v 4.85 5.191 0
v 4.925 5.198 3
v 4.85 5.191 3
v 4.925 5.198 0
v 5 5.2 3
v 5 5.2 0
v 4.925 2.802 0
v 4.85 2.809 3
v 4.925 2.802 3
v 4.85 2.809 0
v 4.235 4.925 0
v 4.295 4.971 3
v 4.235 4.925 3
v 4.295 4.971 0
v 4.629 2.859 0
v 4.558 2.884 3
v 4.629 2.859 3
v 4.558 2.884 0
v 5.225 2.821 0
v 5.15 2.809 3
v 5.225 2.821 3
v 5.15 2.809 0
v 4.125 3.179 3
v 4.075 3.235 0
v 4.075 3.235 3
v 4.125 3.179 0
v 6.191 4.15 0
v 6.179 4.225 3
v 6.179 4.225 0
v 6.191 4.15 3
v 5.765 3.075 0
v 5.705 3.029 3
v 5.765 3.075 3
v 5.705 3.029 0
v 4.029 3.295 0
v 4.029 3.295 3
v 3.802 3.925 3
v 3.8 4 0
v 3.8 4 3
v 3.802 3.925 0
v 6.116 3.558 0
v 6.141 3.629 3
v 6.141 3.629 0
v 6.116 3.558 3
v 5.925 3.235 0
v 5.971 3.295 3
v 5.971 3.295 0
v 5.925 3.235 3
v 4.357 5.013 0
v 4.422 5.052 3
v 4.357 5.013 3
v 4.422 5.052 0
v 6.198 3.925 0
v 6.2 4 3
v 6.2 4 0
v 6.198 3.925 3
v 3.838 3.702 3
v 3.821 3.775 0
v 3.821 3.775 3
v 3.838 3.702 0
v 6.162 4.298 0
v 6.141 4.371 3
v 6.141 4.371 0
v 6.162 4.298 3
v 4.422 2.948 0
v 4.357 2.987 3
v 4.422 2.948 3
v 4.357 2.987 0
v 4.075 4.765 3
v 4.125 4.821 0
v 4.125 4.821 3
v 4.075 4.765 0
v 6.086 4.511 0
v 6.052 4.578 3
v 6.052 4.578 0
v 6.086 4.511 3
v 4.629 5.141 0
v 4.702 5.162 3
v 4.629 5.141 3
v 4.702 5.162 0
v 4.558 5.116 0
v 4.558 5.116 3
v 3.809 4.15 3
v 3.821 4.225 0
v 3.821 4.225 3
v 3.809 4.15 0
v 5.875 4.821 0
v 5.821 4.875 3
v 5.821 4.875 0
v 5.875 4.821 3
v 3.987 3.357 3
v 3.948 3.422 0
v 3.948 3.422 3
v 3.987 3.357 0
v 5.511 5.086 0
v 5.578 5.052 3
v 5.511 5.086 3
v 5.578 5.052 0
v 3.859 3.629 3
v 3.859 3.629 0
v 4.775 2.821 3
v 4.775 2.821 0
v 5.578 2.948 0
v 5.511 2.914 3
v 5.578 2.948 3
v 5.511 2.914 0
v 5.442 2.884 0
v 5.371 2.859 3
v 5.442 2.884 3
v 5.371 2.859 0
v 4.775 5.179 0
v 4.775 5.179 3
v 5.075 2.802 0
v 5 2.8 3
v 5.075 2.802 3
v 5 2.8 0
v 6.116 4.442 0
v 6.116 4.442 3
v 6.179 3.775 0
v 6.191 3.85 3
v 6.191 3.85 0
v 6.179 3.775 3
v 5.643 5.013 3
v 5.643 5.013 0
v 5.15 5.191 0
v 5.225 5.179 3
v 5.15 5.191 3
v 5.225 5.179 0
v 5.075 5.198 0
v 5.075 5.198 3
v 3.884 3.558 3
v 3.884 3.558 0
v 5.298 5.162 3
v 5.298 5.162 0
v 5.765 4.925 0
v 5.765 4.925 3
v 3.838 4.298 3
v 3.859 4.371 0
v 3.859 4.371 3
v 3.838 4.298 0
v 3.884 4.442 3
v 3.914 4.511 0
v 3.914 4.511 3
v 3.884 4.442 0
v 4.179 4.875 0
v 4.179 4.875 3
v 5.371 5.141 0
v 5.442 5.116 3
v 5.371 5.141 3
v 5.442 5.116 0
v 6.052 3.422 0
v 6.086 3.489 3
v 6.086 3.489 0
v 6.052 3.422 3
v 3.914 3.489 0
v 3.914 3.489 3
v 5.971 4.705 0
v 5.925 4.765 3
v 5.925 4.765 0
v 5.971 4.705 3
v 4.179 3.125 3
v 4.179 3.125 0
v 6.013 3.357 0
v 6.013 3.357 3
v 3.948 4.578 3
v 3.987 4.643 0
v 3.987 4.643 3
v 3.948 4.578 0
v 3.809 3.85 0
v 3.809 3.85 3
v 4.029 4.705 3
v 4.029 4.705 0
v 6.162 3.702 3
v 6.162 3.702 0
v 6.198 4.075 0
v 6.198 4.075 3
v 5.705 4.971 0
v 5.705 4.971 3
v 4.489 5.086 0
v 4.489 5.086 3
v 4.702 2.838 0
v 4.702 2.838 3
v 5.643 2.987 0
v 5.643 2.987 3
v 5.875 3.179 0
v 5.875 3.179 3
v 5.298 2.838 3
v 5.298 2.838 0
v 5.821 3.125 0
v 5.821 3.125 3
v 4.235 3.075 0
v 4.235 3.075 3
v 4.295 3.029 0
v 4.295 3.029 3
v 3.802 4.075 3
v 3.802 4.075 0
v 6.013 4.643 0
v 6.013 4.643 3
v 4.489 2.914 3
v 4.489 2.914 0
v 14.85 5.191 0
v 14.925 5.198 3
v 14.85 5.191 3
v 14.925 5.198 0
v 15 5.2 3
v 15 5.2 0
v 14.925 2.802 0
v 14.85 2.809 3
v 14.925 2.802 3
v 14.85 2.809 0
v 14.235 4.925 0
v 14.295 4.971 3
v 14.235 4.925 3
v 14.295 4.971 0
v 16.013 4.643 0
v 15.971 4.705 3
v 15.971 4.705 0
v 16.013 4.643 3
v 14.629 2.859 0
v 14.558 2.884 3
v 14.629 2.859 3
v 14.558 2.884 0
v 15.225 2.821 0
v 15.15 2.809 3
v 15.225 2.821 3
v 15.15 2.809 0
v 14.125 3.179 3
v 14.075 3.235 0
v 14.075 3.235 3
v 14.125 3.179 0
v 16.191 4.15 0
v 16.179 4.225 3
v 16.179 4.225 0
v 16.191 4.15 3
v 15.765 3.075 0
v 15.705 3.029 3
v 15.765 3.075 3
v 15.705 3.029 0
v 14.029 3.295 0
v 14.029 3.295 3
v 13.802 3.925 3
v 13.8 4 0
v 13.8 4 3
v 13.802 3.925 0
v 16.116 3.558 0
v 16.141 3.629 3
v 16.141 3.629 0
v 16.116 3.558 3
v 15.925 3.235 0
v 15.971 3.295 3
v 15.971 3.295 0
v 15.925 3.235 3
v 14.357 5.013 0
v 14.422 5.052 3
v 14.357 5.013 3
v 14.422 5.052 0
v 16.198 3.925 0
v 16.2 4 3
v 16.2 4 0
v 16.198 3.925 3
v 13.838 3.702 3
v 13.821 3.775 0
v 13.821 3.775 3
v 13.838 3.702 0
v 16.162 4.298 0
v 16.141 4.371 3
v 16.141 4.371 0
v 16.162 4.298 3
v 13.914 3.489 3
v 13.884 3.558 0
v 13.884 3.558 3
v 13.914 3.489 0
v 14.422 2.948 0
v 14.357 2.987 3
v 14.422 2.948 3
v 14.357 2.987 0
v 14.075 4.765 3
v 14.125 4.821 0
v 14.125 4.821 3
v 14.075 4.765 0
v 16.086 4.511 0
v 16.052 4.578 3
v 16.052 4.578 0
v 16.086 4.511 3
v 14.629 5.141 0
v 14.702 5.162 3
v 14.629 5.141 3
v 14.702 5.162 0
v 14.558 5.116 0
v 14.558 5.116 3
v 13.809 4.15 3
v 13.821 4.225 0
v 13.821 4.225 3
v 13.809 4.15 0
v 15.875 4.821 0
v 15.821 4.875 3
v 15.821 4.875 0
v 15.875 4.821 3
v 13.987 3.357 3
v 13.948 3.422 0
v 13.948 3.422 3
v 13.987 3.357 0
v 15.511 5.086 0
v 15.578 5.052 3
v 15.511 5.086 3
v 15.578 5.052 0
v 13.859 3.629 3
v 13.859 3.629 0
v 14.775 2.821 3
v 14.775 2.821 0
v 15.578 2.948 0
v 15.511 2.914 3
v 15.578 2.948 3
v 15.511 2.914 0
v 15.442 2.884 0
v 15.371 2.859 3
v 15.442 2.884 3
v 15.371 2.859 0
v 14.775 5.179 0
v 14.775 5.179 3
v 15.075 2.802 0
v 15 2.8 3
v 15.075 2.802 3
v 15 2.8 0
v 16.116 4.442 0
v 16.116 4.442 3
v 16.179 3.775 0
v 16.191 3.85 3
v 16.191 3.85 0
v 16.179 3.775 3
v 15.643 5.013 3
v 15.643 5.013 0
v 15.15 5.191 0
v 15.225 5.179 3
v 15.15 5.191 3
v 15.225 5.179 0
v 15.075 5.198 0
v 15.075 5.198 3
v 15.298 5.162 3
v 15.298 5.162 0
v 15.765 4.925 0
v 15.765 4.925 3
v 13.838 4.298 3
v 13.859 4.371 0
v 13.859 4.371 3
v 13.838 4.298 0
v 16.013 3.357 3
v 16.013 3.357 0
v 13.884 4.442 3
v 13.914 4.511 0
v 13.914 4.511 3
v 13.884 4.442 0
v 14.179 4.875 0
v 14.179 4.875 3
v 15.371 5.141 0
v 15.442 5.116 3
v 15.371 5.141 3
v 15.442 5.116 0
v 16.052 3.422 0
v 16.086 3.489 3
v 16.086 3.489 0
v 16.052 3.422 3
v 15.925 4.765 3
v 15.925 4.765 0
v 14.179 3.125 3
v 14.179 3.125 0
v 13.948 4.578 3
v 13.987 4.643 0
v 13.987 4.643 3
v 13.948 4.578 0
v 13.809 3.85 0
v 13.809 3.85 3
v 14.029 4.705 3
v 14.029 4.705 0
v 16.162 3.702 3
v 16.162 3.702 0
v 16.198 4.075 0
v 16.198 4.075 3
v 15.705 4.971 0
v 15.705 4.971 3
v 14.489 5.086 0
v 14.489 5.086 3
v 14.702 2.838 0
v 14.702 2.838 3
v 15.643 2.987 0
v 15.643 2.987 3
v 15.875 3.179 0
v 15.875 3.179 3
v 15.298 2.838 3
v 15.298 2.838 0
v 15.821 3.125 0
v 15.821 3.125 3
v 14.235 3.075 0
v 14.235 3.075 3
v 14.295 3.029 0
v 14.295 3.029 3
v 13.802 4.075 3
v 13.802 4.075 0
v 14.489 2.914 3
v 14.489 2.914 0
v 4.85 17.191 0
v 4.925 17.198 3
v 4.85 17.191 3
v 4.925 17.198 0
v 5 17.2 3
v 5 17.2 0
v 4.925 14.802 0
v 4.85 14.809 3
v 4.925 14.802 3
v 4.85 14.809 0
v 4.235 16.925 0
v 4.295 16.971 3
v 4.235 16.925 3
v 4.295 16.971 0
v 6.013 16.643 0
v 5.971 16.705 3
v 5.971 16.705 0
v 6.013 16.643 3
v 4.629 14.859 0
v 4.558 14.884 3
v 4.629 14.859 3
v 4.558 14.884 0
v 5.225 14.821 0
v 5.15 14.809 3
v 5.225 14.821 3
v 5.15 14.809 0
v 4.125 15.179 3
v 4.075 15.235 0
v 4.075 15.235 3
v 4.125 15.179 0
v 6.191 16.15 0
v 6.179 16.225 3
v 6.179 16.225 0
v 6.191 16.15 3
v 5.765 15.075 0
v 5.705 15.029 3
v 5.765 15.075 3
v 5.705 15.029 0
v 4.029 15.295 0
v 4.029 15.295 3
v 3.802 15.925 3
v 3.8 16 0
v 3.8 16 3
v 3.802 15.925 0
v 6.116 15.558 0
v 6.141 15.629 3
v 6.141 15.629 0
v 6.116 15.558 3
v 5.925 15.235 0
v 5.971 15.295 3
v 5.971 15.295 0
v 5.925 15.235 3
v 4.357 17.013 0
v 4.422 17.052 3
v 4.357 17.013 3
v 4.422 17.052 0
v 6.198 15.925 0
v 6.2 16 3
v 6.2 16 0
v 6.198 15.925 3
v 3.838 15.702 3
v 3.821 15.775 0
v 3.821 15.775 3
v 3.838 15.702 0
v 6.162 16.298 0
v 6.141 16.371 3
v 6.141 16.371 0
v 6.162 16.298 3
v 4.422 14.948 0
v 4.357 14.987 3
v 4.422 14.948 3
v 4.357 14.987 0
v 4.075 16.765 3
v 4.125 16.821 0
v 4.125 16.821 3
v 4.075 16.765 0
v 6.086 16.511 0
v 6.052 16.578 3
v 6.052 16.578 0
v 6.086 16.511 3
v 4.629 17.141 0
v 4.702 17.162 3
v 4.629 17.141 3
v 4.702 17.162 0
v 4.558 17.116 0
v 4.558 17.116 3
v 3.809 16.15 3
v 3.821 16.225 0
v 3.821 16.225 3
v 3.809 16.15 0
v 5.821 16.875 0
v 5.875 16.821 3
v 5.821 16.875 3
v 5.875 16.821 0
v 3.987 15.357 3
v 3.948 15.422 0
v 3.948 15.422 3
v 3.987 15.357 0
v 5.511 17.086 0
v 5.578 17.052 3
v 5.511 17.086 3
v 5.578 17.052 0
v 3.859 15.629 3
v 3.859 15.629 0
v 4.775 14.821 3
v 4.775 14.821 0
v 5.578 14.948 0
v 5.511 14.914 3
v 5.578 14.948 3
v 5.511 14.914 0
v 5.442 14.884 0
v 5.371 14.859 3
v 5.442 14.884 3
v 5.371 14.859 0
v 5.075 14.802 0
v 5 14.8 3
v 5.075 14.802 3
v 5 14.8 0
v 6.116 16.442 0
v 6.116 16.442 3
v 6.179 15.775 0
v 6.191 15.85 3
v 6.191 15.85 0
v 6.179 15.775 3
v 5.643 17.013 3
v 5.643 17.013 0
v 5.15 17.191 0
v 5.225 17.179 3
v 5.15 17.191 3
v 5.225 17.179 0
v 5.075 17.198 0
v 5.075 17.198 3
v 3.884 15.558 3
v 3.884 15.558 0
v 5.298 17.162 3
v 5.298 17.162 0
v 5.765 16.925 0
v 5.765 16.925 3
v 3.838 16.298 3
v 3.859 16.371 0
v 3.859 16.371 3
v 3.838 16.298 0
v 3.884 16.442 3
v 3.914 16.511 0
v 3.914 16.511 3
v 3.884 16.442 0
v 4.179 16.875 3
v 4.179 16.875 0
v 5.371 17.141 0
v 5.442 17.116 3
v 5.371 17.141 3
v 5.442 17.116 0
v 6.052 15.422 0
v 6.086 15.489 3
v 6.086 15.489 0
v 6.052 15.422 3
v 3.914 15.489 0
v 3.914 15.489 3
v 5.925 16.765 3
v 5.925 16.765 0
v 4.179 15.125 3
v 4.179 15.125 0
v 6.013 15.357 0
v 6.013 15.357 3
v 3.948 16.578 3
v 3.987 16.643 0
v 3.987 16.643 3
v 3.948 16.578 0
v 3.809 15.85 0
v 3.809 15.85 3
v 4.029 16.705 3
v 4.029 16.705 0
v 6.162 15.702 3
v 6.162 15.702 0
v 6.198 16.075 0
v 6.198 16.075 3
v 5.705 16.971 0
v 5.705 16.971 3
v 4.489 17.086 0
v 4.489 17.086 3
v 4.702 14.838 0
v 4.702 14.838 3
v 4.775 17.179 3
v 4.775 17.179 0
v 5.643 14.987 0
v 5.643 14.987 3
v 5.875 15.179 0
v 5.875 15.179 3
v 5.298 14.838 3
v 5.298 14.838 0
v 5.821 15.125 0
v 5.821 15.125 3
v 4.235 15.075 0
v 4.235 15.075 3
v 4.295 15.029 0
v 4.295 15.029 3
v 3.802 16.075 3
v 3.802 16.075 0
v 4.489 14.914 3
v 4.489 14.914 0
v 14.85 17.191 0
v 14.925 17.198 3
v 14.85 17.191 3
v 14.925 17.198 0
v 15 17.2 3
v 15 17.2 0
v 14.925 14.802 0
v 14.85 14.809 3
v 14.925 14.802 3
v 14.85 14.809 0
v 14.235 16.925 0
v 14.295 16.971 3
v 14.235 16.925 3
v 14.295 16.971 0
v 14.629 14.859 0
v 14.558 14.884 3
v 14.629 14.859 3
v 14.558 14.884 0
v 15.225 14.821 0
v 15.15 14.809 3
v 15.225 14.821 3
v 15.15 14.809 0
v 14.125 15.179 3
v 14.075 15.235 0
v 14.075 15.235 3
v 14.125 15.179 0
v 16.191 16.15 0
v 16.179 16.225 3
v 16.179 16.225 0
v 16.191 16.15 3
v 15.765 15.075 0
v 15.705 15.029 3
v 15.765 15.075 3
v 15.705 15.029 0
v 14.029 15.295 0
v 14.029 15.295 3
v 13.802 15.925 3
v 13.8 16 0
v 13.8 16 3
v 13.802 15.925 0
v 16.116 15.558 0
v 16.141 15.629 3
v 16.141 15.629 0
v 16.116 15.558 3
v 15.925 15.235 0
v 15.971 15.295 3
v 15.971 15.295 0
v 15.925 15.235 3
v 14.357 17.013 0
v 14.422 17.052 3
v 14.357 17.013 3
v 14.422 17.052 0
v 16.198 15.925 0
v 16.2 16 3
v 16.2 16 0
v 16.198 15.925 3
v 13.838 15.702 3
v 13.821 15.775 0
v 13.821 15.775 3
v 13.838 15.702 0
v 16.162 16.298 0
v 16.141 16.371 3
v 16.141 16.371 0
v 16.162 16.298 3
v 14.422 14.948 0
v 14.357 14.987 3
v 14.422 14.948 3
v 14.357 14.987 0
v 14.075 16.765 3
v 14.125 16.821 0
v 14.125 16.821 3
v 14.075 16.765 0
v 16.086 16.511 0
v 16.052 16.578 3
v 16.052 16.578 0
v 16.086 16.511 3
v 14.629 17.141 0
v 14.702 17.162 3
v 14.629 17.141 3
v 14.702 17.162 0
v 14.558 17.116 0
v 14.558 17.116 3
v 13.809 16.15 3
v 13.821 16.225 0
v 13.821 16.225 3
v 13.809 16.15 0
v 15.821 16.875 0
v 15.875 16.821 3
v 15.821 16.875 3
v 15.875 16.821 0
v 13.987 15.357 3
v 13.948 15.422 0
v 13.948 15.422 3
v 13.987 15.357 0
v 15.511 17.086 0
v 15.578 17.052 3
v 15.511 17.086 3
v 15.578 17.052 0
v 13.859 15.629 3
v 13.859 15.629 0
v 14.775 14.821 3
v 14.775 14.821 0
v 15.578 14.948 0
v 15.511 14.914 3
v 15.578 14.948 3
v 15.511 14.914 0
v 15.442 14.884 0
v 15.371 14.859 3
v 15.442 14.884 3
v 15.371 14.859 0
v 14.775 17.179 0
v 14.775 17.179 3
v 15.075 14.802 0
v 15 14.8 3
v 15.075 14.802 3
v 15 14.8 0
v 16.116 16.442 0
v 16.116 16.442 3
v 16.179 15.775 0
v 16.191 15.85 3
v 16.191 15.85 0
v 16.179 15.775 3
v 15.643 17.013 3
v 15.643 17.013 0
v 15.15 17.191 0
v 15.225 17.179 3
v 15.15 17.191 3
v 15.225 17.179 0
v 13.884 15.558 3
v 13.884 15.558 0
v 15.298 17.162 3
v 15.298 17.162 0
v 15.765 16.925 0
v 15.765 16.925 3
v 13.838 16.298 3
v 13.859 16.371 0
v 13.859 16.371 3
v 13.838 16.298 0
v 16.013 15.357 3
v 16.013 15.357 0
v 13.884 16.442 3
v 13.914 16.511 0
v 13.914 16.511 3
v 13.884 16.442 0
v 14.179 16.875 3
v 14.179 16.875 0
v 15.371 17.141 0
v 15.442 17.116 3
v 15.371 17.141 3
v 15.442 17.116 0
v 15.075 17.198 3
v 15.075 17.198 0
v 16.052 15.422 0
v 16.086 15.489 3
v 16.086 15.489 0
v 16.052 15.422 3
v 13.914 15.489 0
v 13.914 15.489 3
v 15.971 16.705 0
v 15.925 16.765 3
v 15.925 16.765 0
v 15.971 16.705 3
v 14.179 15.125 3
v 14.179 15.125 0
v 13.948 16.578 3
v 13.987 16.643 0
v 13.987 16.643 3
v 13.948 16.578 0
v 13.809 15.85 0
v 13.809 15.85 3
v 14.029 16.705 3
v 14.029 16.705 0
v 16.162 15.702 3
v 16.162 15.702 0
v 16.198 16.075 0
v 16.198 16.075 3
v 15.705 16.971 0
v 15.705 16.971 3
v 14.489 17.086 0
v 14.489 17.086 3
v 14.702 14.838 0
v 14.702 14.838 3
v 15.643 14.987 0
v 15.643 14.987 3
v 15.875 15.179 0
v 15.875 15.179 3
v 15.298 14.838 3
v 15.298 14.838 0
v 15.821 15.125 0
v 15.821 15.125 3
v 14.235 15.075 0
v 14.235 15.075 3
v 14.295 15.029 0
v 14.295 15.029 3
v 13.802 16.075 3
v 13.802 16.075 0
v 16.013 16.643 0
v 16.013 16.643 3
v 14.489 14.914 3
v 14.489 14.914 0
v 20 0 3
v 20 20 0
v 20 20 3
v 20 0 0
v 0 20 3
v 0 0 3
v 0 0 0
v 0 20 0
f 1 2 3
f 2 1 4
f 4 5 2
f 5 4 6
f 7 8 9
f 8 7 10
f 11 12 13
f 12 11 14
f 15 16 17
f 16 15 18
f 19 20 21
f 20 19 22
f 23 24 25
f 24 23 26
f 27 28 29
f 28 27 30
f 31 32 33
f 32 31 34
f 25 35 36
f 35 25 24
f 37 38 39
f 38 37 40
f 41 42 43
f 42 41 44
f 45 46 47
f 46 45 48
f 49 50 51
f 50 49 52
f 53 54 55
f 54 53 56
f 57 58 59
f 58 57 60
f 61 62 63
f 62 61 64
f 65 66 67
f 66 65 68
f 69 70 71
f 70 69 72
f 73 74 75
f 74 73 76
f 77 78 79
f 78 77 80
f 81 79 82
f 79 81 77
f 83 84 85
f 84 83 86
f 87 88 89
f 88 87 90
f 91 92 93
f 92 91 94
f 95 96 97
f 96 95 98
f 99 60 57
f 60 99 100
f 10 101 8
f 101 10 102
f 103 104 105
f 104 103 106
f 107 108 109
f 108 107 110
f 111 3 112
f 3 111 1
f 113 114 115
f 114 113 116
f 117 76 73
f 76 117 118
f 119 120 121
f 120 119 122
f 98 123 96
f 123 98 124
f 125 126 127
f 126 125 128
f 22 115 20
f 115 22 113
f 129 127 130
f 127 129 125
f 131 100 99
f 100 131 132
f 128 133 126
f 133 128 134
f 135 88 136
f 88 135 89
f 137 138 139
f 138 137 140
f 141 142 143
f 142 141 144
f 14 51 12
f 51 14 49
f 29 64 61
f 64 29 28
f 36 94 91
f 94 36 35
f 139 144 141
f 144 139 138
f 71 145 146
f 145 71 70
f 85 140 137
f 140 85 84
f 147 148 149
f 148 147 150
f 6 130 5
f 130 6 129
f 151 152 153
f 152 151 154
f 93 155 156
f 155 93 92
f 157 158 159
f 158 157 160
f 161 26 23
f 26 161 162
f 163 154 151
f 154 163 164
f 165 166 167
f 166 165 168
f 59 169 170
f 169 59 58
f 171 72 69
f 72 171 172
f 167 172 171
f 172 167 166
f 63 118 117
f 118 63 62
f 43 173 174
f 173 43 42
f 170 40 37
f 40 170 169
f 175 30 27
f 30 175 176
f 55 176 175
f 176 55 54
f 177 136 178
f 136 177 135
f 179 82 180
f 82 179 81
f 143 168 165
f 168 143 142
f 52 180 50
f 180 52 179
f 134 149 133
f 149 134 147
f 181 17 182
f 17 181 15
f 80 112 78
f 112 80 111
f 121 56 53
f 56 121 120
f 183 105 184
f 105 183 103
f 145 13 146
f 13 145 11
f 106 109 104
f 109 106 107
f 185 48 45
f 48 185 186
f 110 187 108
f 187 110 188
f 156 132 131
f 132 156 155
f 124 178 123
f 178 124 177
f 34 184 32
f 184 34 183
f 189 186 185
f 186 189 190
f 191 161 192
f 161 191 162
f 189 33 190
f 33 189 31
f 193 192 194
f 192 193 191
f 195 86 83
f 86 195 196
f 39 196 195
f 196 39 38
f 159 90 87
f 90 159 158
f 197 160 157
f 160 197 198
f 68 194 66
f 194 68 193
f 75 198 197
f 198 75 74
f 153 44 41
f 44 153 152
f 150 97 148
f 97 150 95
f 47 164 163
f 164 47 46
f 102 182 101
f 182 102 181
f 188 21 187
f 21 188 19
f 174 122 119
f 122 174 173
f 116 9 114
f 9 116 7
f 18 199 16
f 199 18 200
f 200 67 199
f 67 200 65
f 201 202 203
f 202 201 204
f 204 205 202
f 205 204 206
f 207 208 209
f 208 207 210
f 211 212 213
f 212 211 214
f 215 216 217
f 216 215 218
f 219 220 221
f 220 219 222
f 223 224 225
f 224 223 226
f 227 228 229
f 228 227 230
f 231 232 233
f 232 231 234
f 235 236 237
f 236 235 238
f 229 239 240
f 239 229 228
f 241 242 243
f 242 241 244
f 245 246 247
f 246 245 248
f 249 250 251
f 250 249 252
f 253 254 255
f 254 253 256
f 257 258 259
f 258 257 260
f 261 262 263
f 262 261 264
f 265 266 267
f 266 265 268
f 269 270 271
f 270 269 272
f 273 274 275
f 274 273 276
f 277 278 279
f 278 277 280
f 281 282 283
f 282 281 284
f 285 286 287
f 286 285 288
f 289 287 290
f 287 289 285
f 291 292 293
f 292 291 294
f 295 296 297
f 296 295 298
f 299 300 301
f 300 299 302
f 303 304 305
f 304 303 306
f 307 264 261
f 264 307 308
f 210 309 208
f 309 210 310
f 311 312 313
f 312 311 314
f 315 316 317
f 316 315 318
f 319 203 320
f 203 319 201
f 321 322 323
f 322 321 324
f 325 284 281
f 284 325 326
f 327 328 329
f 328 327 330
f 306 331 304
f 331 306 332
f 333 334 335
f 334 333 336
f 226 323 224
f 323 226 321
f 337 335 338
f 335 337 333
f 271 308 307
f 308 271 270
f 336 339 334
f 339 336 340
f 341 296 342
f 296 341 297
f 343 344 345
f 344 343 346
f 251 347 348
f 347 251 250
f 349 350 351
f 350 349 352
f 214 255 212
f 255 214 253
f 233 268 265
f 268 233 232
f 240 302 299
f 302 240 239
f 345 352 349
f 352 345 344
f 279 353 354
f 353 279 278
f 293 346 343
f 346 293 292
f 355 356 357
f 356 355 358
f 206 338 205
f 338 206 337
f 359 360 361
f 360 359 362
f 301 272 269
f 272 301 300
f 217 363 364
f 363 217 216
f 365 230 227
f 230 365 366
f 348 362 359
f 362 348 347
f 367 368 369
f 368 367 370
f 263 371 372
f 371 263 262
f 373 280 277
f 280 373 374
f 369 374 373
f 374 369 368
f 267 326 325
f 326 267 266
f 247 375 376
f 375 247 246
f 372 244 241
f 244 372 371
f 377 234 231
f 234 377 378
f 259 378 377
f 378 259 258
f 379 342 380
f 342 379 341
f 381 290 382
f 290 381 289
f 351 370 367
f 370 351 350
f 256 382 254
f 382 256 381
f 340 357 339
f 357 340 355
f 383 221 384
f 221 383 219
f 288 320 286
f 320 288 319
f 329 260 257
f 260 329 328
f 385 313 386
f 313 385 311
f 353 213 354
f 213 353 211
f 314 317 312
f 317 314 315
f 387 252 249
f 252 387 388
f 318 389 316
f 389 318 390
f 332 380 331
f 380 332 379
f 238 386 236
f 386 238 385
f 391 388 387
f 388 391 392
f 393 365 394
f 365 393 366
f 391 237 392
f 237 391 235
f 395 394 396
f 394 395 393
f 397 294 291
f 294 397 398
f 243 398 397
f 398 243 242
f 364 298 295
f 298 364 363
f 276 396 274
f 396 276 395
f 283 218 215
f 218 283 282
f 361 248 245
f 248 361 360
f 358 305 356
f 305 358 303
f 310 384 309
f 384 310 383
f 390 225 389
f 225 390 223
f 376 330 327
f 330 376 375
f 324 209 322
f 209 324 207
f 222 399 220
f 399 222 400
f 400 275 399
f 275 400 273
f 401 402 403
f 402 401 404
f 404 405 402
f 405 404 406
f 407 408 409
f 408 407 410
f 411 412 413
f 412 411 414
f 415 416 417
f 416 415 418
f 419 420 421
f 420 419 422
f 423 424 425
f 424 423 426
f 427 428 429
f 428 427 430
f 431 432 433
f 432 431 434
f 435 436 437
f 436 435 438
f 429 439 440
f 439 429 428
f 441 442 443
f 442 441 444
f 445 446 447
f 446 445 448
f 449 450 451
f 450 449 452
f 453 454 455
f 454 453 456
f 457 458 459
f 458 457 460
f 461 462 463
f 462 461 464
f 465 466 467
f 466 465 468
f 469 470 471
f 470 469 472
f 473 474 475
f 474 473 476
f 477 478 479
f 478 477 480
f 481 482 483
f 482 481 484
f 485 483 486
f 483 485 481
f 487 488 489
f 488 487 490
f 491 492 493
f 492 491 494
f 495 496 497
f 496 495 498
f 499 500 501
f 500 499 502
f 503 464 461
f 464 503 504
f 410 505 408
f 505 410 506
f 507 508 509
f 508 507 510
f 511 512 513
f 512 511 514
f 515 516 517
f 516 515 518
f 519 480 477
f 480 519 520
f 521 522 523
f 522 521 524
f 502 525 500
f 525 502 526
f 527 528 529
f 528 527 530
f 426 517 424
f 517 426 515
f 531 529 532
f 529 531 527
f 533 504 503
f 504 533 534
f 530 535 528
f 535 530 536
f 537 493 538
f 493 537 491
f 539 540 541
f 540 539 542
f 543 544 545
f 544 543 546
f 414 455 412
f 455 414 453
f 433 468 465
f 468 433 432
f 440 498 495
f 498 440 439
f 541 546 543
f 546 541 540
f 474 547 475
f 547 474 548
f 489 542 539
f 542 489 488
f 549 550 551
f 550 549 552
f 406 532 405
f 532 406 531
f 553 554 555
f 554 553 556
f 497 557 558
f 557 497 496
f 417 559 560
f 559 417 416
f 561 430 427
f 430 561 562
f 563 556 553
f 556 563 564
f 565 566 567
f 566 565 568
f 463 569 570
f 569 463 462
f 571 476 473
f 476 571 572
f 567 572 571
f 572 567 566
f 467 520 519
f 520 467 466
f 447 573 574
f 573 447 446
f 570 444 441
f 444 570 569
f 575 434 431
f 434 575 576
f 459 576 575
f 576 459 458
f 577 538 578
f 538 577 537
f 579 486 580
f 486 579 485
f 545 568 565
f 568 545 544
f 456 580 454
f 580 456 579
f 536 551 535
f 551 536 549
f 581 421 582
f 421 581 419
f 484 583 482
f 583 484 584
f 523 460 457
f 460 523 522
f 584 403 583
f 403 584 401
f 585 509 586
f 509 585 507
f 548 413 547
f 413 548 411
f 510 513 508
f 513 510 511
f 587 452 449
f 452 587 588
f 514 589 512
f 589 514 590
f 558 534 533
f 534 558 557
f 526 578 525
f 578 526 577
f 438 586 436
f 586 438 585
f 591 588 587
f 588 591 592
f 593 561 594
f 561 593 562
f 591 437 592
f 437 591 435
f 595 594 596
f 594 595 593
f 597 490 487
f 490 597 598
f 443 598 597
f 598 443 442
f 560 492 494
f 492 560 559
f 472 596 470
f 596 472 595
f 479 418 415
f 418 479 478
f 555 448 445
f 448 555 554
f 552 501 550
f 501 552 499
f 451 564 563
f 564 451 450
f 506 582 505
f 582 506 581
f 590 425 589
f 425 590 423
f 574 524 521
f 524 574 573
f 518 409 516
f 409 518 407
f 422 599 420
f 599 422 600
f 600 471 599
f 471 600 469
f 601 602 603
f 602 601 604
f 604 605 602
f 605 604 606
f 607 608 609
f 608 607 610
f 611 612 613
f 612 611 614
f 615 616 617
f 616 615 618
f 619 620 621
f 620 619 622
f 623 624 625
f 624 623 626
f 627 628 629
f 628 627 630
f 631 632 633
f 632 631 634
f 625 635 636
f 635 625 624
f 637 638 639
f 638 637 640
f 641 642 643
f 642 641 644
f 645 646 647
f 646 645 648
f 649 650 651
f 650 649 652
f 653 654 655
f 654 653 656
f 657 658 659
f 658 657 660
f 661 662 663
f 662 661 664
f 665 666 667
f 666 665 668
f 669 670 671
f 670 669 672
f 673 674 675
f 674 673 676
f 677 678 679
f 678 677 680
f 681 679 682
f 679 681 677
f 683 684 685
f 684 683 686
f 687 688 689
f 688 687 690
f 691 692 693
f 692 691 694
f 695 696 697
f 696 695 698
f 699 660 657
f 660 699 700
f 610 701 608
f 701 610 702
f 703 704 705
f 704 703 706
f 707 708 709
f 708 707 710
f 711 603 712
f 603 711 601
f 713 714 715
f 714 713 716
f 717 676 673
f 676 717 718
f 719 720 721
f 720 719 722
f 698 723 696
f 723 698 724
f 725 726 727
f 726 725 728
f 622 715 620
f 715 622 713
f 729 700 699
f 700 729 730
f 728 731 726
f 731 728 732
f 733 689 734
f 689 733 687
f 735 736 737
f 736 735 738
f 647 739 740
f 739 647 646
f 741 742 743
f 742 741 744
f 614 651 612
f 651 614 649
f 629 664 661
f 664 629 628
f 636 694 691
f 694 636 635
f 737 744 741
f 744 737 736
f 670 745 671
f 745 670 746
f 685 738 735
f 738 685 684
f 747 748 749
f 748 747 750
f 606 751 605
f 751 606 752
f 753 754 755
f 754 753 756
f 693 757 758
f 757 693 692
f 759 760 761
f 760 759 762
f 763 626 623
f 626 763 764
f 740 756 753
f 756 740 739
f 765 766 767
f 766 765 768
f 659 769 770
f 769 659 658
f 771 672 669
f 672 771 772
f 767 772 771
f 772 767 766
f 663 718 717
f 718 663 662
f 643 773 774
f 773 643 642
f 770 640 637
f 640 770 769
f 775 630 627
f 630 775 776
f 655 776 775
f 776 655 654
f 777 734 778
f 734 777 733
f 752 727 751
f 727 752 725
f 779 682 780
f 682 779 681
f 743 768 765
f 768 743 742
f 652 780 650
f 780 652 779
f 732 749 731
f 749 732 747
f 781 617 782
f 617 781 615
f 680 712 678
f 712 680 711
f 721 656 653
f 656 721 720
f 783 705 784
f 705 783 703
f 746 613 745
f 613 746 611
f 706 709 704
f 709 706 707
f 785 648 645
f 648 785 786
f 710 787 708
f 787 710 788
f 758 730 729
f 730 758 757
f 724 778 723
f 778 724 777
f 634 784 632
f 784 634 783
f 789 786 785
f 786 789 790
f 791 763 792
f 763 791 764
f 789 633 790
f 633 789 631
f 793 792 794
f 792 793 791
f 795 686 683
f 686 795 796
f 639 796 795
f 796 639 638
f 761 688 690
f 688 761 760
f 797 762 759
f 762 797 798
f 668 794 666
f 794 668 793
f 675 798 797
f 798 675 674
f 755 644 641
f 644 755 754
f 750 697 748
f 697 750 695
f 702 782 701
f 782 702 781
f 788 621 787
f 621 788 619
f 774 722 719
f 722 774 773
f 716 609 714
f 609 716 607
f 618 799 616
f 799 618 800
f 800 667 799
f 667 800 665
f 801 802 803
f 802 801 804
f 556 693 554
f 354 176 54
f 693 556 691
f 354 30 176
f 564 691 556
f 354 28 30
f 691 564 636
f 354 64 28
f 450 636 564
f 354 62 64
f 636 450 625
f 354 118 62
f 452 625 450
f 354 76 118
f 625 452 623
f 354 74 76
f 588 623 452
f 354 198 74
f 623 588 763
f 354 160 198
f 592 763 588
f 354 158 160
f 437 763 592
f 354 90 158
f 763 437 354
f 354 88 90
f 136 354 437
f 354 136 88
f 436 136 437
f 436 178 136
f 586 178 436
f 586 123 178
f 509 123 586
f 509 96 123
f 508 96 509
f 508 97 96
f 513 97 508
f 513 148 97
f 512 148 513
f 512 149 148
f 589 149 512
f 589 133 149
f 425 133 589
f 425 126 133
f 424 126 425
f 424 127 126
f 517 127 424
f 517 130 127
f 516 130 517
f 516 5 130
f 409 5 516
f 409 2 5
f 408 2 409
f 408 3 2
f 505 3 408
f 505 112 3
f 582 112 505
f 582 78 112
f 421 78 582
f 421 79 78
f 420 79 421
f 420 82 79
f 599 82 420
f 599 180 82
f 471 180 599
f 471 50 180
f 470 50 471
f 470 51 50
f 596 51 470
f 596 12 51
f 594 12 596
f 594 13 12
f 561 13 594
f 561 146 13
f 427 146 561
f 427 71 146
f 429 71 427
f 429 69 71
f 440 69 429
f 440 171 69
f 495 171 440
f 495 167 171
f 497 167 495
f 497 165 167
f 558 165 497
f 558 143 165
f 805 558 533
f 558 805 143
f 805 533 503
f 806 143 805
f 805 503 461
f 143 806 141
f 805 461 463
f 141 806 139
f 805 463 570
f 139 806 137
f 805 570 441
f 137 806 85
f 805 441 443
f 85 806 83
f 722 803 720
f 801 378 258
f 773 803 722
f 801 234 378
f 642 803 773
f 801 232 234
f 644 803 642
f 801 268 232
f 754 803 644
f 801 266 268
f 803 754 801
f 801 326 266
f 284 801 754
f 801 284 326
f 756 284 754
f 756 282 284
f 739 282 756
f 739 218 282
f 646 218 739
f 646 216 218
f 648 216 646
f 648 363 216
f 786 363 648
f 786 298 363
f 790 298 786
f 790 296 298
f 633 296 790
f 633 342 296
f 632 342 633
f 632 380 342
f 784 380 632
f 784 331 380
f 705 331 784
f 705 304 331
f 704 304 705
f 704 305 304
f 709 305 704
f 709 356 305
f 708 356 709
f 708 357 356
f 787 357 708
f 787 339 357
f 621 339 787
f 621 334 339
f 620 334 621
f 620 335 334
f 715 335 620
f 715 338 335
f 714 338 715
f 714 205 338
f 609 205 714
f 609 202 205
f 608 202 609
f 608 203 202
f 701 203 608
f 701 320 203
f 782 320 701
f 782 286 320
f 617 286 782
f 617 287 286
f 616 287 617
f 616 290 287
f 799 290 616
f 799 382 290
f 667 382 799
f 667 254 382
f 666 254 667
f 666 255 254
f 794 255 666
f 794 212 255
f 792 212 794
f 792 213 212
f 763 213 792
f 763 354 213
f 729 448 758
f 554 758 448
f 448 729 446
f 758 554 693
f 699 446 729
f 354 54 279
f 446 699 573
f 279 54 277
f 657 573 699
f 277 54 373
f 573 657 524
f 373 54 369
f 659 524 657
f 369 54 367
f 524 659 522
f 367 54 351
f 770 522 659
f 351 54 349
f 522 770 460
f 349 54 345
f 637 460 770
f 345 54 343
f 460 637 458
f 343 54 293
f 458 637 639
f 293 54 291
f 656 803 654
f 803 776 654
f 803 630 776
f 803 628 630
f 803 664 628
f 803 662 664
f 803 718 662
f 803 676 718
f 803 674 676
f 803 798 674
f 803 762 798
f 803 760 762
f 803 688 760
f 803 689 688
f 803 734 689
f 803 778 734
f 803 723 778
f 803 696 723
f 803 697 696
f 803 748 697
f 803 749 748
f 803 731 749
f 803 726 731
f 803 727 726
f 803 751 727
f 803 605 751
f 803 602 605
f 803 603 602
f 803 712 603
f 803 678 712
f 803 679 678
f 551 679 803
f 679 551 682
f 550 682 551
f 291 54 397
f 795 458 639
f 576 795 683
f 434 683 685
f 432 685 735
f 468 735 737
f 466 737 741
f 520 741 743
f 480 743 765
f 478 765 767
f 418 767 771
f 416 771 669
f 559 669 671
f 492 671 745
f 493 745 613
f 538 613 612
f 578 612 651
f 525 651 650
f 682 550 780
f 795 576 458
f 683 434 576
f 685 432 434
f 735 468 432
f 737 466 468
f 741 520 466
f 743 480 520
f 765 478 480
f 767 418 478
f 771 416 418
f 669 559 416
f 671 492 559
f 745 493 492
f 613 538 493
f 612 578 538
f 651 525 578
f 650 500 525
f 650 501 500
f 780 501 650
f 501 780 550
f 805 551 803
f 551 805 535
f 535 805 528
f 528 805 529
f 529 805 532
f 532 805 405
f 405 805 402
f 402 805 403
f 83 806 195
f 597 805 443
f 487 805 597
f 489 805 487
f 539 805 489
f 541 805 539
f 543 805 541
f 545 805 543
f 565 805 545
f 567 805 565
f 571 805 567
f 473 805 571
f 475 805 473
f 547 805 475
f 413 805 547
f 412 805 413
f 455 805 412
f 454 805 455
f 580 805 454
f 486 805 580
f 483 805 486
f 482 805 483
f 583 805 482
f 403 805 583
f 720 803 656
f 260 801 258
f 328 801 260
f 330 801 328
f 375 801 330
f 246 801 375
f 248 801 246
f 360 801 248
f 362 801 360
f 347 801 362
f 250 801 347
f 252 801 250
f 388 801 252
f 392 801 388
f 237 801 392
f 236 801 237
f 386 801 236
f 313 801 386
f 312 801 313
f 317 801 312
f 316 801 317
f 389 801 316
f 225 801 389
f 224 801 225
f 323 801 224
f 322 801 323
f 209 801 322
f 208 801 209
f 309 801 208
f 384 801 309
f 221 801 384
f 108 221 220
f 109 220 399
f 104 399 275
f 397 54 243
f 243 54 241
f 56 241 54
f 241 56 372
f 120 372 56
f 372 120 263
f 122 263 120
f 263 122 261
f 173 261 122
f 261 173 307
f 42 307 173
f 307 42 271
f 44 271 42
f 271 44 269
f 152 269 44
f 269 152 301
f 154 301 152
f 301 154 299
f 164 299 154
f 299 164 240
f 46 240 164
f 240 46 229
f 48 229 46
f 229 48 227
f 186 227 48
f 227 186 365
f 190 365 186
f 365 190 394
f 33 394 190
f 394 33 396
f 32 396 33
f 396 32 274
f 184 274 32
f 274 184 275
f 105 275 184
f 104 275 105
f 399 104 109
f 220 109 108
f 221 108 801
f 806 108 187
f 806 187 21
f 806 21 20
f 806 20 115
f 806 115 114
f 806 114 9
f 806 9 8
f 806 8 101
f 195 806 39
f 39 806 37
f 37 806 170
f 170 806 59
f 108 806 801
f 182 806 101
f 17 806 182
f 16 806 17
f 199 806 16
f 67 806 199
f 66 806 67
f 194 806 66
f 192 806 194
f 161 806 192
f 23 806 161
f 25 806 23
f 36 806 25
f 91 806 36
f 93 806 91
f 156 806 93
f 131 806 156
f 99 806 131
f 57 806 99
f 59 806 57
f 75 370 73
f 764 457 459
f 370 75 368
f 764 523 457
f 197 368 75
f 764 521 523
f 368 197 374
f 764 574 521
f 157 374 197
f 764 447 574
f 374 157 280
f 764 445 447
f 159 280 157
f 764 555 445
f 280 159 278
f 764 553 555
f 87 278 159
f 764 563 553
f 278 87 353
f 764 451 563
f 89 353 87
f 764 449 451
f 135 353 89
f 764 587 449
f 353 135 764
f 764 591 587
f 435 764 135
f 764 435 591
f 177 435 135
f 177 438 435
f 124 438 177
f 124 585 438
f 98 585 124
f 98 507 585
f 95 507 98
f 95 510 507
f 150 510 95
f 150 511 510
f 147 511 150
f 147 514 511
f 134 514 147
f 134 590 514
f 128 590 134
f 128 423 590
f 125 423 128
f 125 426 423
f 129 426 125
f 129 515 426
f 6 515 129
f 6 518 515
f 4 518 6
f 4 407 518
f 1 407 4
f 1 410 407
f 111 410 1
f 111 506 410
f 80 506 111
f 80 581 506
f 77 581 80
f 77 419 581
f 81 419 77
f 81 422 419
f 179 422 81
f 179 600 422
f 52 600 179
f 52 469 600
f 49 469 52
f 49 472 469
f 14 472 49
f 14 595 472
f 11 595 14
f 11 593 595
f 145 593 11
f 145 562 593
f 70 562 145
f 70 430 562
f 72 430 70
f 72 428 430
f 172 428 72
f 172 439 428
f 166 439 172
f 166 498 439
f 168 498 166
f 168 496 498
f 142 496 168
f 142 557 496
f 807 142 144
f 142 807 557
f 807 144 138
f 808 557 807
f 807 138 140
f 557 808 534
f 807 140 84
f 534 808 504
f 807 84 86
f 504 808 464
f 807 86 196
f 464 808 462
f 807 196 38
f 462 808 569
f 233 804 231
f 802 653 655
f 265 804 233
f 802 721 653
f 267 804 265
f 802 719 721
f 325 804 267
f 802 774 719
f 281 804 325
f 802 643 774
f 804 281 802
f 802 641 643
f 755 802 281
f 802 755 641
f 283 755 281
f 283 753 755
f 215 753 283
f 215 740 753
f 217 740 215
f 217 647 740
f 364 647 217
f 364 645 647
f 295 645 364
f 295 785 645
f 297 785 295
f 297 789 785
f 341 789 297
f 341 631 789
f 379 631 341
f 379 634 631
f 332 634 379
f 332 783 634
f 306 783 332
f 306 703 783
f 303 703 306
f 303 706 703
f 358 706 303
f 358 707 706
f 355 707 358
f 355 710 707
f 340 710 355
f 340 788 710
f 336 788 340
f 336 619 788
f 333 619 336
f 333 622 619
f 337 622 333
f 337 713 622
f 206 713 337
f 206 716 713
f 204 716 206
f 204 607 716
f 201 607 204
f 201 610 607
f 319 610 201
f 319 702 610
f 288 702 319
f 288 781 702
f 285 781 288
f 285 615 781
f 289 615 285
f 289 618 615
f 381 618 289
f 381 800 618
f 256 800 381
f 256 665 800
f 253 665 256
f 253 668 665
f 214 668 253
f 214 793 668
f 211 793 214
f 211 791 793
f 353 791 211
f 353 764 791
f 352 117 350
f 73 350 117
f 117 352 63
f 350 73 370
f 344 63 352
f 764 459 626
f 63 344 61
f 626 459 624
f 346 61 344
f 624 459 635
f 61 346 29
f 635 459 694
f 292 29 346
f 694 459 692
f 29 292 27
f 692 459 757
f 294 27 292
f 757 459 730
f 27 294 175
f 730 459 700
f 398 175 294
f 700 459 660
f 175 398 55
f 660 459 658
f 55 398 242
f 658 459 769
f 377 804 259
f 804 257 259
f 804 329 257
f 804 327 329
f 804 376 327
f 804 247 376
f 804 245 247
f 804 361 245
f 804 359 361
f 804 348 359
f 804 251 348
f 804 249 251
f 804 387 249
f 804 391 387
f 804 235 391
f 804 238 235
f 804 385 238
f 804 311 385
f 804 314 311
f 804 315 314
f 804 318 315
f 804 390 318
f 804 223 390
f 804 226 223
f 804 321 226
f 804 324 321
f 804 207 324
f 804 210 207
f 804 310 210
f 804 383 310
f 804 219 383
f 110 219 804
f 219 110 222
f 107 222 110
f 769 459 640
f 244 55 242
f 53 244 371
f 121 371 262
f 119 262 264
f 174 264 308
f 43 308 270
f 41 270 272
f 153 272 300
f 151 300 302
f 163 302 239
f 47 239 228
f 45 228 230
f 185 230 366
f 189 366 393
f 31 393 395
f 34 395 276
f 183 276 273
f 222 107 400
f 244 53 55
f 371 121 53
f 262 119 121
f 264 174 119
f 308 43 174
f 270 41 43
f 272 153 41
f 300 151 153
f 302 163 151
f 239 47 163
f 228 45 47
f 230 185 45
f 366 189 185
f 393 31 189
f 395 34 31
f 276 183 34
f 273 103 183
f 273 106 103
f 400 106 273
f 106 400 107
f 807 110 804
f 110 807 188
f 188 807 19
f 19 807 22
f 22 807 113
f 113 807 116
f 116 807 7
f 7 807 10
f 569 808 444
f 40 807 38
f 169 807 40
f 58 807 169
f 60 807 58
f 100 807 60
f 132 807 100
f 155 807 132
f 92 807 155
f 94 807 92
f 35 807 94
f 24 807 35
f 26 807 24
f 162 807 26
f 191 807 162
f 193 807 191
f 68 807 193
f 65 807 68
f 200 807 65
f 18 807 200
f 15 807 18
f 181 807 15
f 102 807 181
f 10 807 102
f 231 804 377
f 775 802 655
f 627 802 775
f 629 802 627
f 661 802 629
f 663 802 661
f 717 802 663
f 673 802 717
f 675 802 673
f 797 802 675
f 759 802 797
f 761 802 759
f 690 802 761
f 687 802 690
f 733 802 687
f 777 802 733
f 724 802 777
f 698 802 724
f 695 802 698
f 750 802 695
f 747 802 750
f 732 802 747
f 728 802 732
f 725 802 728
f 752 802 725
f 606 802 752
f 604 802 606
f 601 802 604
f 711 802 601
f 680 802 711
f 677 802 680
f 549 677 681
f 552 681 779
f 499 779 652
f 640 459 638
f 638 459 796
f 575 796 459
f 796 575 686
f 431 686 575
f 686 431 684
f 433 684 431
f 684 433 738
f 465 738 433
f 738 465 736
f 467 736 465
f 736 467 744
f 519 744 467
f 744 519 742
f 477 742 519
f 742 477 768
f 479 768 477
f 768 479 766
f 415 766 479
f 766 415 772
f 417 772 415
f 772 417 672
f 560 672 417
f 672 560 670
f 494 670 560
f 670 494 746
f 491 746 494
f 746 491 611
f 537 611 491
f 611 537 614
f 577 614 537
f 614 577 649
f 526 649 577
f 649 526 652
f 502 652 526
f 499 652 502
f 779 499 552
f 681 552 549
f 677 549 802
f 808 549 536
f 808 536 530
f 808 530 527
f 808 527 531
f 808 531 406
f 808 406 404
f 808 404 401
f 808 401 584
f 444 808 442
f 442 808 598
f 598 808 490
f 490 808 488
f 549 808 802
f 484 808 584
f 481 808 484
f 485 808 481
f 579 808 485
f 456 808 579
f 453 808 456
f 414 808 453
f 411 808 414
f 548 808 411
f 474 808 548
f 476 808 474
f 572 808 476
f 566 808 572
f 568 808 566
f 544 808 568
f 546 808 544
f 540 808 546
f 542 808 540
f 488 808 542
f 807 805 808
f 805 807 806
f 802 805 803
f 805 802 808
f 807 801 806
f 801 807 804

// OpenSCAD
difference(){
	union(){ 

        translate([0,0,0]){
           cube([20,20,3], center=false);
        }                
	}
	union() {
        translate([5,4,0]){
            rotate([0,0,90]){
                cylinder(h=200, r=1.2, $fn=100, center=true);
            }   
        }
        translate([15,4,0]){
            rotate([0,0,90]){
                cylinder(h=200, r=1.2, $fn=100, center=true);
            }   
        }
        
        translate([5,16,0]){
            rotate([0,0,90]){
                cylinder(h=200, r=1.2, $fn=100, center=true);
            }   
        }
        translate([15,16,0]){
            rotate([0,0,90]){
                cylinder(h=200, r=1.2, $fn=100, center=true);
            }   
        }
	}
}
